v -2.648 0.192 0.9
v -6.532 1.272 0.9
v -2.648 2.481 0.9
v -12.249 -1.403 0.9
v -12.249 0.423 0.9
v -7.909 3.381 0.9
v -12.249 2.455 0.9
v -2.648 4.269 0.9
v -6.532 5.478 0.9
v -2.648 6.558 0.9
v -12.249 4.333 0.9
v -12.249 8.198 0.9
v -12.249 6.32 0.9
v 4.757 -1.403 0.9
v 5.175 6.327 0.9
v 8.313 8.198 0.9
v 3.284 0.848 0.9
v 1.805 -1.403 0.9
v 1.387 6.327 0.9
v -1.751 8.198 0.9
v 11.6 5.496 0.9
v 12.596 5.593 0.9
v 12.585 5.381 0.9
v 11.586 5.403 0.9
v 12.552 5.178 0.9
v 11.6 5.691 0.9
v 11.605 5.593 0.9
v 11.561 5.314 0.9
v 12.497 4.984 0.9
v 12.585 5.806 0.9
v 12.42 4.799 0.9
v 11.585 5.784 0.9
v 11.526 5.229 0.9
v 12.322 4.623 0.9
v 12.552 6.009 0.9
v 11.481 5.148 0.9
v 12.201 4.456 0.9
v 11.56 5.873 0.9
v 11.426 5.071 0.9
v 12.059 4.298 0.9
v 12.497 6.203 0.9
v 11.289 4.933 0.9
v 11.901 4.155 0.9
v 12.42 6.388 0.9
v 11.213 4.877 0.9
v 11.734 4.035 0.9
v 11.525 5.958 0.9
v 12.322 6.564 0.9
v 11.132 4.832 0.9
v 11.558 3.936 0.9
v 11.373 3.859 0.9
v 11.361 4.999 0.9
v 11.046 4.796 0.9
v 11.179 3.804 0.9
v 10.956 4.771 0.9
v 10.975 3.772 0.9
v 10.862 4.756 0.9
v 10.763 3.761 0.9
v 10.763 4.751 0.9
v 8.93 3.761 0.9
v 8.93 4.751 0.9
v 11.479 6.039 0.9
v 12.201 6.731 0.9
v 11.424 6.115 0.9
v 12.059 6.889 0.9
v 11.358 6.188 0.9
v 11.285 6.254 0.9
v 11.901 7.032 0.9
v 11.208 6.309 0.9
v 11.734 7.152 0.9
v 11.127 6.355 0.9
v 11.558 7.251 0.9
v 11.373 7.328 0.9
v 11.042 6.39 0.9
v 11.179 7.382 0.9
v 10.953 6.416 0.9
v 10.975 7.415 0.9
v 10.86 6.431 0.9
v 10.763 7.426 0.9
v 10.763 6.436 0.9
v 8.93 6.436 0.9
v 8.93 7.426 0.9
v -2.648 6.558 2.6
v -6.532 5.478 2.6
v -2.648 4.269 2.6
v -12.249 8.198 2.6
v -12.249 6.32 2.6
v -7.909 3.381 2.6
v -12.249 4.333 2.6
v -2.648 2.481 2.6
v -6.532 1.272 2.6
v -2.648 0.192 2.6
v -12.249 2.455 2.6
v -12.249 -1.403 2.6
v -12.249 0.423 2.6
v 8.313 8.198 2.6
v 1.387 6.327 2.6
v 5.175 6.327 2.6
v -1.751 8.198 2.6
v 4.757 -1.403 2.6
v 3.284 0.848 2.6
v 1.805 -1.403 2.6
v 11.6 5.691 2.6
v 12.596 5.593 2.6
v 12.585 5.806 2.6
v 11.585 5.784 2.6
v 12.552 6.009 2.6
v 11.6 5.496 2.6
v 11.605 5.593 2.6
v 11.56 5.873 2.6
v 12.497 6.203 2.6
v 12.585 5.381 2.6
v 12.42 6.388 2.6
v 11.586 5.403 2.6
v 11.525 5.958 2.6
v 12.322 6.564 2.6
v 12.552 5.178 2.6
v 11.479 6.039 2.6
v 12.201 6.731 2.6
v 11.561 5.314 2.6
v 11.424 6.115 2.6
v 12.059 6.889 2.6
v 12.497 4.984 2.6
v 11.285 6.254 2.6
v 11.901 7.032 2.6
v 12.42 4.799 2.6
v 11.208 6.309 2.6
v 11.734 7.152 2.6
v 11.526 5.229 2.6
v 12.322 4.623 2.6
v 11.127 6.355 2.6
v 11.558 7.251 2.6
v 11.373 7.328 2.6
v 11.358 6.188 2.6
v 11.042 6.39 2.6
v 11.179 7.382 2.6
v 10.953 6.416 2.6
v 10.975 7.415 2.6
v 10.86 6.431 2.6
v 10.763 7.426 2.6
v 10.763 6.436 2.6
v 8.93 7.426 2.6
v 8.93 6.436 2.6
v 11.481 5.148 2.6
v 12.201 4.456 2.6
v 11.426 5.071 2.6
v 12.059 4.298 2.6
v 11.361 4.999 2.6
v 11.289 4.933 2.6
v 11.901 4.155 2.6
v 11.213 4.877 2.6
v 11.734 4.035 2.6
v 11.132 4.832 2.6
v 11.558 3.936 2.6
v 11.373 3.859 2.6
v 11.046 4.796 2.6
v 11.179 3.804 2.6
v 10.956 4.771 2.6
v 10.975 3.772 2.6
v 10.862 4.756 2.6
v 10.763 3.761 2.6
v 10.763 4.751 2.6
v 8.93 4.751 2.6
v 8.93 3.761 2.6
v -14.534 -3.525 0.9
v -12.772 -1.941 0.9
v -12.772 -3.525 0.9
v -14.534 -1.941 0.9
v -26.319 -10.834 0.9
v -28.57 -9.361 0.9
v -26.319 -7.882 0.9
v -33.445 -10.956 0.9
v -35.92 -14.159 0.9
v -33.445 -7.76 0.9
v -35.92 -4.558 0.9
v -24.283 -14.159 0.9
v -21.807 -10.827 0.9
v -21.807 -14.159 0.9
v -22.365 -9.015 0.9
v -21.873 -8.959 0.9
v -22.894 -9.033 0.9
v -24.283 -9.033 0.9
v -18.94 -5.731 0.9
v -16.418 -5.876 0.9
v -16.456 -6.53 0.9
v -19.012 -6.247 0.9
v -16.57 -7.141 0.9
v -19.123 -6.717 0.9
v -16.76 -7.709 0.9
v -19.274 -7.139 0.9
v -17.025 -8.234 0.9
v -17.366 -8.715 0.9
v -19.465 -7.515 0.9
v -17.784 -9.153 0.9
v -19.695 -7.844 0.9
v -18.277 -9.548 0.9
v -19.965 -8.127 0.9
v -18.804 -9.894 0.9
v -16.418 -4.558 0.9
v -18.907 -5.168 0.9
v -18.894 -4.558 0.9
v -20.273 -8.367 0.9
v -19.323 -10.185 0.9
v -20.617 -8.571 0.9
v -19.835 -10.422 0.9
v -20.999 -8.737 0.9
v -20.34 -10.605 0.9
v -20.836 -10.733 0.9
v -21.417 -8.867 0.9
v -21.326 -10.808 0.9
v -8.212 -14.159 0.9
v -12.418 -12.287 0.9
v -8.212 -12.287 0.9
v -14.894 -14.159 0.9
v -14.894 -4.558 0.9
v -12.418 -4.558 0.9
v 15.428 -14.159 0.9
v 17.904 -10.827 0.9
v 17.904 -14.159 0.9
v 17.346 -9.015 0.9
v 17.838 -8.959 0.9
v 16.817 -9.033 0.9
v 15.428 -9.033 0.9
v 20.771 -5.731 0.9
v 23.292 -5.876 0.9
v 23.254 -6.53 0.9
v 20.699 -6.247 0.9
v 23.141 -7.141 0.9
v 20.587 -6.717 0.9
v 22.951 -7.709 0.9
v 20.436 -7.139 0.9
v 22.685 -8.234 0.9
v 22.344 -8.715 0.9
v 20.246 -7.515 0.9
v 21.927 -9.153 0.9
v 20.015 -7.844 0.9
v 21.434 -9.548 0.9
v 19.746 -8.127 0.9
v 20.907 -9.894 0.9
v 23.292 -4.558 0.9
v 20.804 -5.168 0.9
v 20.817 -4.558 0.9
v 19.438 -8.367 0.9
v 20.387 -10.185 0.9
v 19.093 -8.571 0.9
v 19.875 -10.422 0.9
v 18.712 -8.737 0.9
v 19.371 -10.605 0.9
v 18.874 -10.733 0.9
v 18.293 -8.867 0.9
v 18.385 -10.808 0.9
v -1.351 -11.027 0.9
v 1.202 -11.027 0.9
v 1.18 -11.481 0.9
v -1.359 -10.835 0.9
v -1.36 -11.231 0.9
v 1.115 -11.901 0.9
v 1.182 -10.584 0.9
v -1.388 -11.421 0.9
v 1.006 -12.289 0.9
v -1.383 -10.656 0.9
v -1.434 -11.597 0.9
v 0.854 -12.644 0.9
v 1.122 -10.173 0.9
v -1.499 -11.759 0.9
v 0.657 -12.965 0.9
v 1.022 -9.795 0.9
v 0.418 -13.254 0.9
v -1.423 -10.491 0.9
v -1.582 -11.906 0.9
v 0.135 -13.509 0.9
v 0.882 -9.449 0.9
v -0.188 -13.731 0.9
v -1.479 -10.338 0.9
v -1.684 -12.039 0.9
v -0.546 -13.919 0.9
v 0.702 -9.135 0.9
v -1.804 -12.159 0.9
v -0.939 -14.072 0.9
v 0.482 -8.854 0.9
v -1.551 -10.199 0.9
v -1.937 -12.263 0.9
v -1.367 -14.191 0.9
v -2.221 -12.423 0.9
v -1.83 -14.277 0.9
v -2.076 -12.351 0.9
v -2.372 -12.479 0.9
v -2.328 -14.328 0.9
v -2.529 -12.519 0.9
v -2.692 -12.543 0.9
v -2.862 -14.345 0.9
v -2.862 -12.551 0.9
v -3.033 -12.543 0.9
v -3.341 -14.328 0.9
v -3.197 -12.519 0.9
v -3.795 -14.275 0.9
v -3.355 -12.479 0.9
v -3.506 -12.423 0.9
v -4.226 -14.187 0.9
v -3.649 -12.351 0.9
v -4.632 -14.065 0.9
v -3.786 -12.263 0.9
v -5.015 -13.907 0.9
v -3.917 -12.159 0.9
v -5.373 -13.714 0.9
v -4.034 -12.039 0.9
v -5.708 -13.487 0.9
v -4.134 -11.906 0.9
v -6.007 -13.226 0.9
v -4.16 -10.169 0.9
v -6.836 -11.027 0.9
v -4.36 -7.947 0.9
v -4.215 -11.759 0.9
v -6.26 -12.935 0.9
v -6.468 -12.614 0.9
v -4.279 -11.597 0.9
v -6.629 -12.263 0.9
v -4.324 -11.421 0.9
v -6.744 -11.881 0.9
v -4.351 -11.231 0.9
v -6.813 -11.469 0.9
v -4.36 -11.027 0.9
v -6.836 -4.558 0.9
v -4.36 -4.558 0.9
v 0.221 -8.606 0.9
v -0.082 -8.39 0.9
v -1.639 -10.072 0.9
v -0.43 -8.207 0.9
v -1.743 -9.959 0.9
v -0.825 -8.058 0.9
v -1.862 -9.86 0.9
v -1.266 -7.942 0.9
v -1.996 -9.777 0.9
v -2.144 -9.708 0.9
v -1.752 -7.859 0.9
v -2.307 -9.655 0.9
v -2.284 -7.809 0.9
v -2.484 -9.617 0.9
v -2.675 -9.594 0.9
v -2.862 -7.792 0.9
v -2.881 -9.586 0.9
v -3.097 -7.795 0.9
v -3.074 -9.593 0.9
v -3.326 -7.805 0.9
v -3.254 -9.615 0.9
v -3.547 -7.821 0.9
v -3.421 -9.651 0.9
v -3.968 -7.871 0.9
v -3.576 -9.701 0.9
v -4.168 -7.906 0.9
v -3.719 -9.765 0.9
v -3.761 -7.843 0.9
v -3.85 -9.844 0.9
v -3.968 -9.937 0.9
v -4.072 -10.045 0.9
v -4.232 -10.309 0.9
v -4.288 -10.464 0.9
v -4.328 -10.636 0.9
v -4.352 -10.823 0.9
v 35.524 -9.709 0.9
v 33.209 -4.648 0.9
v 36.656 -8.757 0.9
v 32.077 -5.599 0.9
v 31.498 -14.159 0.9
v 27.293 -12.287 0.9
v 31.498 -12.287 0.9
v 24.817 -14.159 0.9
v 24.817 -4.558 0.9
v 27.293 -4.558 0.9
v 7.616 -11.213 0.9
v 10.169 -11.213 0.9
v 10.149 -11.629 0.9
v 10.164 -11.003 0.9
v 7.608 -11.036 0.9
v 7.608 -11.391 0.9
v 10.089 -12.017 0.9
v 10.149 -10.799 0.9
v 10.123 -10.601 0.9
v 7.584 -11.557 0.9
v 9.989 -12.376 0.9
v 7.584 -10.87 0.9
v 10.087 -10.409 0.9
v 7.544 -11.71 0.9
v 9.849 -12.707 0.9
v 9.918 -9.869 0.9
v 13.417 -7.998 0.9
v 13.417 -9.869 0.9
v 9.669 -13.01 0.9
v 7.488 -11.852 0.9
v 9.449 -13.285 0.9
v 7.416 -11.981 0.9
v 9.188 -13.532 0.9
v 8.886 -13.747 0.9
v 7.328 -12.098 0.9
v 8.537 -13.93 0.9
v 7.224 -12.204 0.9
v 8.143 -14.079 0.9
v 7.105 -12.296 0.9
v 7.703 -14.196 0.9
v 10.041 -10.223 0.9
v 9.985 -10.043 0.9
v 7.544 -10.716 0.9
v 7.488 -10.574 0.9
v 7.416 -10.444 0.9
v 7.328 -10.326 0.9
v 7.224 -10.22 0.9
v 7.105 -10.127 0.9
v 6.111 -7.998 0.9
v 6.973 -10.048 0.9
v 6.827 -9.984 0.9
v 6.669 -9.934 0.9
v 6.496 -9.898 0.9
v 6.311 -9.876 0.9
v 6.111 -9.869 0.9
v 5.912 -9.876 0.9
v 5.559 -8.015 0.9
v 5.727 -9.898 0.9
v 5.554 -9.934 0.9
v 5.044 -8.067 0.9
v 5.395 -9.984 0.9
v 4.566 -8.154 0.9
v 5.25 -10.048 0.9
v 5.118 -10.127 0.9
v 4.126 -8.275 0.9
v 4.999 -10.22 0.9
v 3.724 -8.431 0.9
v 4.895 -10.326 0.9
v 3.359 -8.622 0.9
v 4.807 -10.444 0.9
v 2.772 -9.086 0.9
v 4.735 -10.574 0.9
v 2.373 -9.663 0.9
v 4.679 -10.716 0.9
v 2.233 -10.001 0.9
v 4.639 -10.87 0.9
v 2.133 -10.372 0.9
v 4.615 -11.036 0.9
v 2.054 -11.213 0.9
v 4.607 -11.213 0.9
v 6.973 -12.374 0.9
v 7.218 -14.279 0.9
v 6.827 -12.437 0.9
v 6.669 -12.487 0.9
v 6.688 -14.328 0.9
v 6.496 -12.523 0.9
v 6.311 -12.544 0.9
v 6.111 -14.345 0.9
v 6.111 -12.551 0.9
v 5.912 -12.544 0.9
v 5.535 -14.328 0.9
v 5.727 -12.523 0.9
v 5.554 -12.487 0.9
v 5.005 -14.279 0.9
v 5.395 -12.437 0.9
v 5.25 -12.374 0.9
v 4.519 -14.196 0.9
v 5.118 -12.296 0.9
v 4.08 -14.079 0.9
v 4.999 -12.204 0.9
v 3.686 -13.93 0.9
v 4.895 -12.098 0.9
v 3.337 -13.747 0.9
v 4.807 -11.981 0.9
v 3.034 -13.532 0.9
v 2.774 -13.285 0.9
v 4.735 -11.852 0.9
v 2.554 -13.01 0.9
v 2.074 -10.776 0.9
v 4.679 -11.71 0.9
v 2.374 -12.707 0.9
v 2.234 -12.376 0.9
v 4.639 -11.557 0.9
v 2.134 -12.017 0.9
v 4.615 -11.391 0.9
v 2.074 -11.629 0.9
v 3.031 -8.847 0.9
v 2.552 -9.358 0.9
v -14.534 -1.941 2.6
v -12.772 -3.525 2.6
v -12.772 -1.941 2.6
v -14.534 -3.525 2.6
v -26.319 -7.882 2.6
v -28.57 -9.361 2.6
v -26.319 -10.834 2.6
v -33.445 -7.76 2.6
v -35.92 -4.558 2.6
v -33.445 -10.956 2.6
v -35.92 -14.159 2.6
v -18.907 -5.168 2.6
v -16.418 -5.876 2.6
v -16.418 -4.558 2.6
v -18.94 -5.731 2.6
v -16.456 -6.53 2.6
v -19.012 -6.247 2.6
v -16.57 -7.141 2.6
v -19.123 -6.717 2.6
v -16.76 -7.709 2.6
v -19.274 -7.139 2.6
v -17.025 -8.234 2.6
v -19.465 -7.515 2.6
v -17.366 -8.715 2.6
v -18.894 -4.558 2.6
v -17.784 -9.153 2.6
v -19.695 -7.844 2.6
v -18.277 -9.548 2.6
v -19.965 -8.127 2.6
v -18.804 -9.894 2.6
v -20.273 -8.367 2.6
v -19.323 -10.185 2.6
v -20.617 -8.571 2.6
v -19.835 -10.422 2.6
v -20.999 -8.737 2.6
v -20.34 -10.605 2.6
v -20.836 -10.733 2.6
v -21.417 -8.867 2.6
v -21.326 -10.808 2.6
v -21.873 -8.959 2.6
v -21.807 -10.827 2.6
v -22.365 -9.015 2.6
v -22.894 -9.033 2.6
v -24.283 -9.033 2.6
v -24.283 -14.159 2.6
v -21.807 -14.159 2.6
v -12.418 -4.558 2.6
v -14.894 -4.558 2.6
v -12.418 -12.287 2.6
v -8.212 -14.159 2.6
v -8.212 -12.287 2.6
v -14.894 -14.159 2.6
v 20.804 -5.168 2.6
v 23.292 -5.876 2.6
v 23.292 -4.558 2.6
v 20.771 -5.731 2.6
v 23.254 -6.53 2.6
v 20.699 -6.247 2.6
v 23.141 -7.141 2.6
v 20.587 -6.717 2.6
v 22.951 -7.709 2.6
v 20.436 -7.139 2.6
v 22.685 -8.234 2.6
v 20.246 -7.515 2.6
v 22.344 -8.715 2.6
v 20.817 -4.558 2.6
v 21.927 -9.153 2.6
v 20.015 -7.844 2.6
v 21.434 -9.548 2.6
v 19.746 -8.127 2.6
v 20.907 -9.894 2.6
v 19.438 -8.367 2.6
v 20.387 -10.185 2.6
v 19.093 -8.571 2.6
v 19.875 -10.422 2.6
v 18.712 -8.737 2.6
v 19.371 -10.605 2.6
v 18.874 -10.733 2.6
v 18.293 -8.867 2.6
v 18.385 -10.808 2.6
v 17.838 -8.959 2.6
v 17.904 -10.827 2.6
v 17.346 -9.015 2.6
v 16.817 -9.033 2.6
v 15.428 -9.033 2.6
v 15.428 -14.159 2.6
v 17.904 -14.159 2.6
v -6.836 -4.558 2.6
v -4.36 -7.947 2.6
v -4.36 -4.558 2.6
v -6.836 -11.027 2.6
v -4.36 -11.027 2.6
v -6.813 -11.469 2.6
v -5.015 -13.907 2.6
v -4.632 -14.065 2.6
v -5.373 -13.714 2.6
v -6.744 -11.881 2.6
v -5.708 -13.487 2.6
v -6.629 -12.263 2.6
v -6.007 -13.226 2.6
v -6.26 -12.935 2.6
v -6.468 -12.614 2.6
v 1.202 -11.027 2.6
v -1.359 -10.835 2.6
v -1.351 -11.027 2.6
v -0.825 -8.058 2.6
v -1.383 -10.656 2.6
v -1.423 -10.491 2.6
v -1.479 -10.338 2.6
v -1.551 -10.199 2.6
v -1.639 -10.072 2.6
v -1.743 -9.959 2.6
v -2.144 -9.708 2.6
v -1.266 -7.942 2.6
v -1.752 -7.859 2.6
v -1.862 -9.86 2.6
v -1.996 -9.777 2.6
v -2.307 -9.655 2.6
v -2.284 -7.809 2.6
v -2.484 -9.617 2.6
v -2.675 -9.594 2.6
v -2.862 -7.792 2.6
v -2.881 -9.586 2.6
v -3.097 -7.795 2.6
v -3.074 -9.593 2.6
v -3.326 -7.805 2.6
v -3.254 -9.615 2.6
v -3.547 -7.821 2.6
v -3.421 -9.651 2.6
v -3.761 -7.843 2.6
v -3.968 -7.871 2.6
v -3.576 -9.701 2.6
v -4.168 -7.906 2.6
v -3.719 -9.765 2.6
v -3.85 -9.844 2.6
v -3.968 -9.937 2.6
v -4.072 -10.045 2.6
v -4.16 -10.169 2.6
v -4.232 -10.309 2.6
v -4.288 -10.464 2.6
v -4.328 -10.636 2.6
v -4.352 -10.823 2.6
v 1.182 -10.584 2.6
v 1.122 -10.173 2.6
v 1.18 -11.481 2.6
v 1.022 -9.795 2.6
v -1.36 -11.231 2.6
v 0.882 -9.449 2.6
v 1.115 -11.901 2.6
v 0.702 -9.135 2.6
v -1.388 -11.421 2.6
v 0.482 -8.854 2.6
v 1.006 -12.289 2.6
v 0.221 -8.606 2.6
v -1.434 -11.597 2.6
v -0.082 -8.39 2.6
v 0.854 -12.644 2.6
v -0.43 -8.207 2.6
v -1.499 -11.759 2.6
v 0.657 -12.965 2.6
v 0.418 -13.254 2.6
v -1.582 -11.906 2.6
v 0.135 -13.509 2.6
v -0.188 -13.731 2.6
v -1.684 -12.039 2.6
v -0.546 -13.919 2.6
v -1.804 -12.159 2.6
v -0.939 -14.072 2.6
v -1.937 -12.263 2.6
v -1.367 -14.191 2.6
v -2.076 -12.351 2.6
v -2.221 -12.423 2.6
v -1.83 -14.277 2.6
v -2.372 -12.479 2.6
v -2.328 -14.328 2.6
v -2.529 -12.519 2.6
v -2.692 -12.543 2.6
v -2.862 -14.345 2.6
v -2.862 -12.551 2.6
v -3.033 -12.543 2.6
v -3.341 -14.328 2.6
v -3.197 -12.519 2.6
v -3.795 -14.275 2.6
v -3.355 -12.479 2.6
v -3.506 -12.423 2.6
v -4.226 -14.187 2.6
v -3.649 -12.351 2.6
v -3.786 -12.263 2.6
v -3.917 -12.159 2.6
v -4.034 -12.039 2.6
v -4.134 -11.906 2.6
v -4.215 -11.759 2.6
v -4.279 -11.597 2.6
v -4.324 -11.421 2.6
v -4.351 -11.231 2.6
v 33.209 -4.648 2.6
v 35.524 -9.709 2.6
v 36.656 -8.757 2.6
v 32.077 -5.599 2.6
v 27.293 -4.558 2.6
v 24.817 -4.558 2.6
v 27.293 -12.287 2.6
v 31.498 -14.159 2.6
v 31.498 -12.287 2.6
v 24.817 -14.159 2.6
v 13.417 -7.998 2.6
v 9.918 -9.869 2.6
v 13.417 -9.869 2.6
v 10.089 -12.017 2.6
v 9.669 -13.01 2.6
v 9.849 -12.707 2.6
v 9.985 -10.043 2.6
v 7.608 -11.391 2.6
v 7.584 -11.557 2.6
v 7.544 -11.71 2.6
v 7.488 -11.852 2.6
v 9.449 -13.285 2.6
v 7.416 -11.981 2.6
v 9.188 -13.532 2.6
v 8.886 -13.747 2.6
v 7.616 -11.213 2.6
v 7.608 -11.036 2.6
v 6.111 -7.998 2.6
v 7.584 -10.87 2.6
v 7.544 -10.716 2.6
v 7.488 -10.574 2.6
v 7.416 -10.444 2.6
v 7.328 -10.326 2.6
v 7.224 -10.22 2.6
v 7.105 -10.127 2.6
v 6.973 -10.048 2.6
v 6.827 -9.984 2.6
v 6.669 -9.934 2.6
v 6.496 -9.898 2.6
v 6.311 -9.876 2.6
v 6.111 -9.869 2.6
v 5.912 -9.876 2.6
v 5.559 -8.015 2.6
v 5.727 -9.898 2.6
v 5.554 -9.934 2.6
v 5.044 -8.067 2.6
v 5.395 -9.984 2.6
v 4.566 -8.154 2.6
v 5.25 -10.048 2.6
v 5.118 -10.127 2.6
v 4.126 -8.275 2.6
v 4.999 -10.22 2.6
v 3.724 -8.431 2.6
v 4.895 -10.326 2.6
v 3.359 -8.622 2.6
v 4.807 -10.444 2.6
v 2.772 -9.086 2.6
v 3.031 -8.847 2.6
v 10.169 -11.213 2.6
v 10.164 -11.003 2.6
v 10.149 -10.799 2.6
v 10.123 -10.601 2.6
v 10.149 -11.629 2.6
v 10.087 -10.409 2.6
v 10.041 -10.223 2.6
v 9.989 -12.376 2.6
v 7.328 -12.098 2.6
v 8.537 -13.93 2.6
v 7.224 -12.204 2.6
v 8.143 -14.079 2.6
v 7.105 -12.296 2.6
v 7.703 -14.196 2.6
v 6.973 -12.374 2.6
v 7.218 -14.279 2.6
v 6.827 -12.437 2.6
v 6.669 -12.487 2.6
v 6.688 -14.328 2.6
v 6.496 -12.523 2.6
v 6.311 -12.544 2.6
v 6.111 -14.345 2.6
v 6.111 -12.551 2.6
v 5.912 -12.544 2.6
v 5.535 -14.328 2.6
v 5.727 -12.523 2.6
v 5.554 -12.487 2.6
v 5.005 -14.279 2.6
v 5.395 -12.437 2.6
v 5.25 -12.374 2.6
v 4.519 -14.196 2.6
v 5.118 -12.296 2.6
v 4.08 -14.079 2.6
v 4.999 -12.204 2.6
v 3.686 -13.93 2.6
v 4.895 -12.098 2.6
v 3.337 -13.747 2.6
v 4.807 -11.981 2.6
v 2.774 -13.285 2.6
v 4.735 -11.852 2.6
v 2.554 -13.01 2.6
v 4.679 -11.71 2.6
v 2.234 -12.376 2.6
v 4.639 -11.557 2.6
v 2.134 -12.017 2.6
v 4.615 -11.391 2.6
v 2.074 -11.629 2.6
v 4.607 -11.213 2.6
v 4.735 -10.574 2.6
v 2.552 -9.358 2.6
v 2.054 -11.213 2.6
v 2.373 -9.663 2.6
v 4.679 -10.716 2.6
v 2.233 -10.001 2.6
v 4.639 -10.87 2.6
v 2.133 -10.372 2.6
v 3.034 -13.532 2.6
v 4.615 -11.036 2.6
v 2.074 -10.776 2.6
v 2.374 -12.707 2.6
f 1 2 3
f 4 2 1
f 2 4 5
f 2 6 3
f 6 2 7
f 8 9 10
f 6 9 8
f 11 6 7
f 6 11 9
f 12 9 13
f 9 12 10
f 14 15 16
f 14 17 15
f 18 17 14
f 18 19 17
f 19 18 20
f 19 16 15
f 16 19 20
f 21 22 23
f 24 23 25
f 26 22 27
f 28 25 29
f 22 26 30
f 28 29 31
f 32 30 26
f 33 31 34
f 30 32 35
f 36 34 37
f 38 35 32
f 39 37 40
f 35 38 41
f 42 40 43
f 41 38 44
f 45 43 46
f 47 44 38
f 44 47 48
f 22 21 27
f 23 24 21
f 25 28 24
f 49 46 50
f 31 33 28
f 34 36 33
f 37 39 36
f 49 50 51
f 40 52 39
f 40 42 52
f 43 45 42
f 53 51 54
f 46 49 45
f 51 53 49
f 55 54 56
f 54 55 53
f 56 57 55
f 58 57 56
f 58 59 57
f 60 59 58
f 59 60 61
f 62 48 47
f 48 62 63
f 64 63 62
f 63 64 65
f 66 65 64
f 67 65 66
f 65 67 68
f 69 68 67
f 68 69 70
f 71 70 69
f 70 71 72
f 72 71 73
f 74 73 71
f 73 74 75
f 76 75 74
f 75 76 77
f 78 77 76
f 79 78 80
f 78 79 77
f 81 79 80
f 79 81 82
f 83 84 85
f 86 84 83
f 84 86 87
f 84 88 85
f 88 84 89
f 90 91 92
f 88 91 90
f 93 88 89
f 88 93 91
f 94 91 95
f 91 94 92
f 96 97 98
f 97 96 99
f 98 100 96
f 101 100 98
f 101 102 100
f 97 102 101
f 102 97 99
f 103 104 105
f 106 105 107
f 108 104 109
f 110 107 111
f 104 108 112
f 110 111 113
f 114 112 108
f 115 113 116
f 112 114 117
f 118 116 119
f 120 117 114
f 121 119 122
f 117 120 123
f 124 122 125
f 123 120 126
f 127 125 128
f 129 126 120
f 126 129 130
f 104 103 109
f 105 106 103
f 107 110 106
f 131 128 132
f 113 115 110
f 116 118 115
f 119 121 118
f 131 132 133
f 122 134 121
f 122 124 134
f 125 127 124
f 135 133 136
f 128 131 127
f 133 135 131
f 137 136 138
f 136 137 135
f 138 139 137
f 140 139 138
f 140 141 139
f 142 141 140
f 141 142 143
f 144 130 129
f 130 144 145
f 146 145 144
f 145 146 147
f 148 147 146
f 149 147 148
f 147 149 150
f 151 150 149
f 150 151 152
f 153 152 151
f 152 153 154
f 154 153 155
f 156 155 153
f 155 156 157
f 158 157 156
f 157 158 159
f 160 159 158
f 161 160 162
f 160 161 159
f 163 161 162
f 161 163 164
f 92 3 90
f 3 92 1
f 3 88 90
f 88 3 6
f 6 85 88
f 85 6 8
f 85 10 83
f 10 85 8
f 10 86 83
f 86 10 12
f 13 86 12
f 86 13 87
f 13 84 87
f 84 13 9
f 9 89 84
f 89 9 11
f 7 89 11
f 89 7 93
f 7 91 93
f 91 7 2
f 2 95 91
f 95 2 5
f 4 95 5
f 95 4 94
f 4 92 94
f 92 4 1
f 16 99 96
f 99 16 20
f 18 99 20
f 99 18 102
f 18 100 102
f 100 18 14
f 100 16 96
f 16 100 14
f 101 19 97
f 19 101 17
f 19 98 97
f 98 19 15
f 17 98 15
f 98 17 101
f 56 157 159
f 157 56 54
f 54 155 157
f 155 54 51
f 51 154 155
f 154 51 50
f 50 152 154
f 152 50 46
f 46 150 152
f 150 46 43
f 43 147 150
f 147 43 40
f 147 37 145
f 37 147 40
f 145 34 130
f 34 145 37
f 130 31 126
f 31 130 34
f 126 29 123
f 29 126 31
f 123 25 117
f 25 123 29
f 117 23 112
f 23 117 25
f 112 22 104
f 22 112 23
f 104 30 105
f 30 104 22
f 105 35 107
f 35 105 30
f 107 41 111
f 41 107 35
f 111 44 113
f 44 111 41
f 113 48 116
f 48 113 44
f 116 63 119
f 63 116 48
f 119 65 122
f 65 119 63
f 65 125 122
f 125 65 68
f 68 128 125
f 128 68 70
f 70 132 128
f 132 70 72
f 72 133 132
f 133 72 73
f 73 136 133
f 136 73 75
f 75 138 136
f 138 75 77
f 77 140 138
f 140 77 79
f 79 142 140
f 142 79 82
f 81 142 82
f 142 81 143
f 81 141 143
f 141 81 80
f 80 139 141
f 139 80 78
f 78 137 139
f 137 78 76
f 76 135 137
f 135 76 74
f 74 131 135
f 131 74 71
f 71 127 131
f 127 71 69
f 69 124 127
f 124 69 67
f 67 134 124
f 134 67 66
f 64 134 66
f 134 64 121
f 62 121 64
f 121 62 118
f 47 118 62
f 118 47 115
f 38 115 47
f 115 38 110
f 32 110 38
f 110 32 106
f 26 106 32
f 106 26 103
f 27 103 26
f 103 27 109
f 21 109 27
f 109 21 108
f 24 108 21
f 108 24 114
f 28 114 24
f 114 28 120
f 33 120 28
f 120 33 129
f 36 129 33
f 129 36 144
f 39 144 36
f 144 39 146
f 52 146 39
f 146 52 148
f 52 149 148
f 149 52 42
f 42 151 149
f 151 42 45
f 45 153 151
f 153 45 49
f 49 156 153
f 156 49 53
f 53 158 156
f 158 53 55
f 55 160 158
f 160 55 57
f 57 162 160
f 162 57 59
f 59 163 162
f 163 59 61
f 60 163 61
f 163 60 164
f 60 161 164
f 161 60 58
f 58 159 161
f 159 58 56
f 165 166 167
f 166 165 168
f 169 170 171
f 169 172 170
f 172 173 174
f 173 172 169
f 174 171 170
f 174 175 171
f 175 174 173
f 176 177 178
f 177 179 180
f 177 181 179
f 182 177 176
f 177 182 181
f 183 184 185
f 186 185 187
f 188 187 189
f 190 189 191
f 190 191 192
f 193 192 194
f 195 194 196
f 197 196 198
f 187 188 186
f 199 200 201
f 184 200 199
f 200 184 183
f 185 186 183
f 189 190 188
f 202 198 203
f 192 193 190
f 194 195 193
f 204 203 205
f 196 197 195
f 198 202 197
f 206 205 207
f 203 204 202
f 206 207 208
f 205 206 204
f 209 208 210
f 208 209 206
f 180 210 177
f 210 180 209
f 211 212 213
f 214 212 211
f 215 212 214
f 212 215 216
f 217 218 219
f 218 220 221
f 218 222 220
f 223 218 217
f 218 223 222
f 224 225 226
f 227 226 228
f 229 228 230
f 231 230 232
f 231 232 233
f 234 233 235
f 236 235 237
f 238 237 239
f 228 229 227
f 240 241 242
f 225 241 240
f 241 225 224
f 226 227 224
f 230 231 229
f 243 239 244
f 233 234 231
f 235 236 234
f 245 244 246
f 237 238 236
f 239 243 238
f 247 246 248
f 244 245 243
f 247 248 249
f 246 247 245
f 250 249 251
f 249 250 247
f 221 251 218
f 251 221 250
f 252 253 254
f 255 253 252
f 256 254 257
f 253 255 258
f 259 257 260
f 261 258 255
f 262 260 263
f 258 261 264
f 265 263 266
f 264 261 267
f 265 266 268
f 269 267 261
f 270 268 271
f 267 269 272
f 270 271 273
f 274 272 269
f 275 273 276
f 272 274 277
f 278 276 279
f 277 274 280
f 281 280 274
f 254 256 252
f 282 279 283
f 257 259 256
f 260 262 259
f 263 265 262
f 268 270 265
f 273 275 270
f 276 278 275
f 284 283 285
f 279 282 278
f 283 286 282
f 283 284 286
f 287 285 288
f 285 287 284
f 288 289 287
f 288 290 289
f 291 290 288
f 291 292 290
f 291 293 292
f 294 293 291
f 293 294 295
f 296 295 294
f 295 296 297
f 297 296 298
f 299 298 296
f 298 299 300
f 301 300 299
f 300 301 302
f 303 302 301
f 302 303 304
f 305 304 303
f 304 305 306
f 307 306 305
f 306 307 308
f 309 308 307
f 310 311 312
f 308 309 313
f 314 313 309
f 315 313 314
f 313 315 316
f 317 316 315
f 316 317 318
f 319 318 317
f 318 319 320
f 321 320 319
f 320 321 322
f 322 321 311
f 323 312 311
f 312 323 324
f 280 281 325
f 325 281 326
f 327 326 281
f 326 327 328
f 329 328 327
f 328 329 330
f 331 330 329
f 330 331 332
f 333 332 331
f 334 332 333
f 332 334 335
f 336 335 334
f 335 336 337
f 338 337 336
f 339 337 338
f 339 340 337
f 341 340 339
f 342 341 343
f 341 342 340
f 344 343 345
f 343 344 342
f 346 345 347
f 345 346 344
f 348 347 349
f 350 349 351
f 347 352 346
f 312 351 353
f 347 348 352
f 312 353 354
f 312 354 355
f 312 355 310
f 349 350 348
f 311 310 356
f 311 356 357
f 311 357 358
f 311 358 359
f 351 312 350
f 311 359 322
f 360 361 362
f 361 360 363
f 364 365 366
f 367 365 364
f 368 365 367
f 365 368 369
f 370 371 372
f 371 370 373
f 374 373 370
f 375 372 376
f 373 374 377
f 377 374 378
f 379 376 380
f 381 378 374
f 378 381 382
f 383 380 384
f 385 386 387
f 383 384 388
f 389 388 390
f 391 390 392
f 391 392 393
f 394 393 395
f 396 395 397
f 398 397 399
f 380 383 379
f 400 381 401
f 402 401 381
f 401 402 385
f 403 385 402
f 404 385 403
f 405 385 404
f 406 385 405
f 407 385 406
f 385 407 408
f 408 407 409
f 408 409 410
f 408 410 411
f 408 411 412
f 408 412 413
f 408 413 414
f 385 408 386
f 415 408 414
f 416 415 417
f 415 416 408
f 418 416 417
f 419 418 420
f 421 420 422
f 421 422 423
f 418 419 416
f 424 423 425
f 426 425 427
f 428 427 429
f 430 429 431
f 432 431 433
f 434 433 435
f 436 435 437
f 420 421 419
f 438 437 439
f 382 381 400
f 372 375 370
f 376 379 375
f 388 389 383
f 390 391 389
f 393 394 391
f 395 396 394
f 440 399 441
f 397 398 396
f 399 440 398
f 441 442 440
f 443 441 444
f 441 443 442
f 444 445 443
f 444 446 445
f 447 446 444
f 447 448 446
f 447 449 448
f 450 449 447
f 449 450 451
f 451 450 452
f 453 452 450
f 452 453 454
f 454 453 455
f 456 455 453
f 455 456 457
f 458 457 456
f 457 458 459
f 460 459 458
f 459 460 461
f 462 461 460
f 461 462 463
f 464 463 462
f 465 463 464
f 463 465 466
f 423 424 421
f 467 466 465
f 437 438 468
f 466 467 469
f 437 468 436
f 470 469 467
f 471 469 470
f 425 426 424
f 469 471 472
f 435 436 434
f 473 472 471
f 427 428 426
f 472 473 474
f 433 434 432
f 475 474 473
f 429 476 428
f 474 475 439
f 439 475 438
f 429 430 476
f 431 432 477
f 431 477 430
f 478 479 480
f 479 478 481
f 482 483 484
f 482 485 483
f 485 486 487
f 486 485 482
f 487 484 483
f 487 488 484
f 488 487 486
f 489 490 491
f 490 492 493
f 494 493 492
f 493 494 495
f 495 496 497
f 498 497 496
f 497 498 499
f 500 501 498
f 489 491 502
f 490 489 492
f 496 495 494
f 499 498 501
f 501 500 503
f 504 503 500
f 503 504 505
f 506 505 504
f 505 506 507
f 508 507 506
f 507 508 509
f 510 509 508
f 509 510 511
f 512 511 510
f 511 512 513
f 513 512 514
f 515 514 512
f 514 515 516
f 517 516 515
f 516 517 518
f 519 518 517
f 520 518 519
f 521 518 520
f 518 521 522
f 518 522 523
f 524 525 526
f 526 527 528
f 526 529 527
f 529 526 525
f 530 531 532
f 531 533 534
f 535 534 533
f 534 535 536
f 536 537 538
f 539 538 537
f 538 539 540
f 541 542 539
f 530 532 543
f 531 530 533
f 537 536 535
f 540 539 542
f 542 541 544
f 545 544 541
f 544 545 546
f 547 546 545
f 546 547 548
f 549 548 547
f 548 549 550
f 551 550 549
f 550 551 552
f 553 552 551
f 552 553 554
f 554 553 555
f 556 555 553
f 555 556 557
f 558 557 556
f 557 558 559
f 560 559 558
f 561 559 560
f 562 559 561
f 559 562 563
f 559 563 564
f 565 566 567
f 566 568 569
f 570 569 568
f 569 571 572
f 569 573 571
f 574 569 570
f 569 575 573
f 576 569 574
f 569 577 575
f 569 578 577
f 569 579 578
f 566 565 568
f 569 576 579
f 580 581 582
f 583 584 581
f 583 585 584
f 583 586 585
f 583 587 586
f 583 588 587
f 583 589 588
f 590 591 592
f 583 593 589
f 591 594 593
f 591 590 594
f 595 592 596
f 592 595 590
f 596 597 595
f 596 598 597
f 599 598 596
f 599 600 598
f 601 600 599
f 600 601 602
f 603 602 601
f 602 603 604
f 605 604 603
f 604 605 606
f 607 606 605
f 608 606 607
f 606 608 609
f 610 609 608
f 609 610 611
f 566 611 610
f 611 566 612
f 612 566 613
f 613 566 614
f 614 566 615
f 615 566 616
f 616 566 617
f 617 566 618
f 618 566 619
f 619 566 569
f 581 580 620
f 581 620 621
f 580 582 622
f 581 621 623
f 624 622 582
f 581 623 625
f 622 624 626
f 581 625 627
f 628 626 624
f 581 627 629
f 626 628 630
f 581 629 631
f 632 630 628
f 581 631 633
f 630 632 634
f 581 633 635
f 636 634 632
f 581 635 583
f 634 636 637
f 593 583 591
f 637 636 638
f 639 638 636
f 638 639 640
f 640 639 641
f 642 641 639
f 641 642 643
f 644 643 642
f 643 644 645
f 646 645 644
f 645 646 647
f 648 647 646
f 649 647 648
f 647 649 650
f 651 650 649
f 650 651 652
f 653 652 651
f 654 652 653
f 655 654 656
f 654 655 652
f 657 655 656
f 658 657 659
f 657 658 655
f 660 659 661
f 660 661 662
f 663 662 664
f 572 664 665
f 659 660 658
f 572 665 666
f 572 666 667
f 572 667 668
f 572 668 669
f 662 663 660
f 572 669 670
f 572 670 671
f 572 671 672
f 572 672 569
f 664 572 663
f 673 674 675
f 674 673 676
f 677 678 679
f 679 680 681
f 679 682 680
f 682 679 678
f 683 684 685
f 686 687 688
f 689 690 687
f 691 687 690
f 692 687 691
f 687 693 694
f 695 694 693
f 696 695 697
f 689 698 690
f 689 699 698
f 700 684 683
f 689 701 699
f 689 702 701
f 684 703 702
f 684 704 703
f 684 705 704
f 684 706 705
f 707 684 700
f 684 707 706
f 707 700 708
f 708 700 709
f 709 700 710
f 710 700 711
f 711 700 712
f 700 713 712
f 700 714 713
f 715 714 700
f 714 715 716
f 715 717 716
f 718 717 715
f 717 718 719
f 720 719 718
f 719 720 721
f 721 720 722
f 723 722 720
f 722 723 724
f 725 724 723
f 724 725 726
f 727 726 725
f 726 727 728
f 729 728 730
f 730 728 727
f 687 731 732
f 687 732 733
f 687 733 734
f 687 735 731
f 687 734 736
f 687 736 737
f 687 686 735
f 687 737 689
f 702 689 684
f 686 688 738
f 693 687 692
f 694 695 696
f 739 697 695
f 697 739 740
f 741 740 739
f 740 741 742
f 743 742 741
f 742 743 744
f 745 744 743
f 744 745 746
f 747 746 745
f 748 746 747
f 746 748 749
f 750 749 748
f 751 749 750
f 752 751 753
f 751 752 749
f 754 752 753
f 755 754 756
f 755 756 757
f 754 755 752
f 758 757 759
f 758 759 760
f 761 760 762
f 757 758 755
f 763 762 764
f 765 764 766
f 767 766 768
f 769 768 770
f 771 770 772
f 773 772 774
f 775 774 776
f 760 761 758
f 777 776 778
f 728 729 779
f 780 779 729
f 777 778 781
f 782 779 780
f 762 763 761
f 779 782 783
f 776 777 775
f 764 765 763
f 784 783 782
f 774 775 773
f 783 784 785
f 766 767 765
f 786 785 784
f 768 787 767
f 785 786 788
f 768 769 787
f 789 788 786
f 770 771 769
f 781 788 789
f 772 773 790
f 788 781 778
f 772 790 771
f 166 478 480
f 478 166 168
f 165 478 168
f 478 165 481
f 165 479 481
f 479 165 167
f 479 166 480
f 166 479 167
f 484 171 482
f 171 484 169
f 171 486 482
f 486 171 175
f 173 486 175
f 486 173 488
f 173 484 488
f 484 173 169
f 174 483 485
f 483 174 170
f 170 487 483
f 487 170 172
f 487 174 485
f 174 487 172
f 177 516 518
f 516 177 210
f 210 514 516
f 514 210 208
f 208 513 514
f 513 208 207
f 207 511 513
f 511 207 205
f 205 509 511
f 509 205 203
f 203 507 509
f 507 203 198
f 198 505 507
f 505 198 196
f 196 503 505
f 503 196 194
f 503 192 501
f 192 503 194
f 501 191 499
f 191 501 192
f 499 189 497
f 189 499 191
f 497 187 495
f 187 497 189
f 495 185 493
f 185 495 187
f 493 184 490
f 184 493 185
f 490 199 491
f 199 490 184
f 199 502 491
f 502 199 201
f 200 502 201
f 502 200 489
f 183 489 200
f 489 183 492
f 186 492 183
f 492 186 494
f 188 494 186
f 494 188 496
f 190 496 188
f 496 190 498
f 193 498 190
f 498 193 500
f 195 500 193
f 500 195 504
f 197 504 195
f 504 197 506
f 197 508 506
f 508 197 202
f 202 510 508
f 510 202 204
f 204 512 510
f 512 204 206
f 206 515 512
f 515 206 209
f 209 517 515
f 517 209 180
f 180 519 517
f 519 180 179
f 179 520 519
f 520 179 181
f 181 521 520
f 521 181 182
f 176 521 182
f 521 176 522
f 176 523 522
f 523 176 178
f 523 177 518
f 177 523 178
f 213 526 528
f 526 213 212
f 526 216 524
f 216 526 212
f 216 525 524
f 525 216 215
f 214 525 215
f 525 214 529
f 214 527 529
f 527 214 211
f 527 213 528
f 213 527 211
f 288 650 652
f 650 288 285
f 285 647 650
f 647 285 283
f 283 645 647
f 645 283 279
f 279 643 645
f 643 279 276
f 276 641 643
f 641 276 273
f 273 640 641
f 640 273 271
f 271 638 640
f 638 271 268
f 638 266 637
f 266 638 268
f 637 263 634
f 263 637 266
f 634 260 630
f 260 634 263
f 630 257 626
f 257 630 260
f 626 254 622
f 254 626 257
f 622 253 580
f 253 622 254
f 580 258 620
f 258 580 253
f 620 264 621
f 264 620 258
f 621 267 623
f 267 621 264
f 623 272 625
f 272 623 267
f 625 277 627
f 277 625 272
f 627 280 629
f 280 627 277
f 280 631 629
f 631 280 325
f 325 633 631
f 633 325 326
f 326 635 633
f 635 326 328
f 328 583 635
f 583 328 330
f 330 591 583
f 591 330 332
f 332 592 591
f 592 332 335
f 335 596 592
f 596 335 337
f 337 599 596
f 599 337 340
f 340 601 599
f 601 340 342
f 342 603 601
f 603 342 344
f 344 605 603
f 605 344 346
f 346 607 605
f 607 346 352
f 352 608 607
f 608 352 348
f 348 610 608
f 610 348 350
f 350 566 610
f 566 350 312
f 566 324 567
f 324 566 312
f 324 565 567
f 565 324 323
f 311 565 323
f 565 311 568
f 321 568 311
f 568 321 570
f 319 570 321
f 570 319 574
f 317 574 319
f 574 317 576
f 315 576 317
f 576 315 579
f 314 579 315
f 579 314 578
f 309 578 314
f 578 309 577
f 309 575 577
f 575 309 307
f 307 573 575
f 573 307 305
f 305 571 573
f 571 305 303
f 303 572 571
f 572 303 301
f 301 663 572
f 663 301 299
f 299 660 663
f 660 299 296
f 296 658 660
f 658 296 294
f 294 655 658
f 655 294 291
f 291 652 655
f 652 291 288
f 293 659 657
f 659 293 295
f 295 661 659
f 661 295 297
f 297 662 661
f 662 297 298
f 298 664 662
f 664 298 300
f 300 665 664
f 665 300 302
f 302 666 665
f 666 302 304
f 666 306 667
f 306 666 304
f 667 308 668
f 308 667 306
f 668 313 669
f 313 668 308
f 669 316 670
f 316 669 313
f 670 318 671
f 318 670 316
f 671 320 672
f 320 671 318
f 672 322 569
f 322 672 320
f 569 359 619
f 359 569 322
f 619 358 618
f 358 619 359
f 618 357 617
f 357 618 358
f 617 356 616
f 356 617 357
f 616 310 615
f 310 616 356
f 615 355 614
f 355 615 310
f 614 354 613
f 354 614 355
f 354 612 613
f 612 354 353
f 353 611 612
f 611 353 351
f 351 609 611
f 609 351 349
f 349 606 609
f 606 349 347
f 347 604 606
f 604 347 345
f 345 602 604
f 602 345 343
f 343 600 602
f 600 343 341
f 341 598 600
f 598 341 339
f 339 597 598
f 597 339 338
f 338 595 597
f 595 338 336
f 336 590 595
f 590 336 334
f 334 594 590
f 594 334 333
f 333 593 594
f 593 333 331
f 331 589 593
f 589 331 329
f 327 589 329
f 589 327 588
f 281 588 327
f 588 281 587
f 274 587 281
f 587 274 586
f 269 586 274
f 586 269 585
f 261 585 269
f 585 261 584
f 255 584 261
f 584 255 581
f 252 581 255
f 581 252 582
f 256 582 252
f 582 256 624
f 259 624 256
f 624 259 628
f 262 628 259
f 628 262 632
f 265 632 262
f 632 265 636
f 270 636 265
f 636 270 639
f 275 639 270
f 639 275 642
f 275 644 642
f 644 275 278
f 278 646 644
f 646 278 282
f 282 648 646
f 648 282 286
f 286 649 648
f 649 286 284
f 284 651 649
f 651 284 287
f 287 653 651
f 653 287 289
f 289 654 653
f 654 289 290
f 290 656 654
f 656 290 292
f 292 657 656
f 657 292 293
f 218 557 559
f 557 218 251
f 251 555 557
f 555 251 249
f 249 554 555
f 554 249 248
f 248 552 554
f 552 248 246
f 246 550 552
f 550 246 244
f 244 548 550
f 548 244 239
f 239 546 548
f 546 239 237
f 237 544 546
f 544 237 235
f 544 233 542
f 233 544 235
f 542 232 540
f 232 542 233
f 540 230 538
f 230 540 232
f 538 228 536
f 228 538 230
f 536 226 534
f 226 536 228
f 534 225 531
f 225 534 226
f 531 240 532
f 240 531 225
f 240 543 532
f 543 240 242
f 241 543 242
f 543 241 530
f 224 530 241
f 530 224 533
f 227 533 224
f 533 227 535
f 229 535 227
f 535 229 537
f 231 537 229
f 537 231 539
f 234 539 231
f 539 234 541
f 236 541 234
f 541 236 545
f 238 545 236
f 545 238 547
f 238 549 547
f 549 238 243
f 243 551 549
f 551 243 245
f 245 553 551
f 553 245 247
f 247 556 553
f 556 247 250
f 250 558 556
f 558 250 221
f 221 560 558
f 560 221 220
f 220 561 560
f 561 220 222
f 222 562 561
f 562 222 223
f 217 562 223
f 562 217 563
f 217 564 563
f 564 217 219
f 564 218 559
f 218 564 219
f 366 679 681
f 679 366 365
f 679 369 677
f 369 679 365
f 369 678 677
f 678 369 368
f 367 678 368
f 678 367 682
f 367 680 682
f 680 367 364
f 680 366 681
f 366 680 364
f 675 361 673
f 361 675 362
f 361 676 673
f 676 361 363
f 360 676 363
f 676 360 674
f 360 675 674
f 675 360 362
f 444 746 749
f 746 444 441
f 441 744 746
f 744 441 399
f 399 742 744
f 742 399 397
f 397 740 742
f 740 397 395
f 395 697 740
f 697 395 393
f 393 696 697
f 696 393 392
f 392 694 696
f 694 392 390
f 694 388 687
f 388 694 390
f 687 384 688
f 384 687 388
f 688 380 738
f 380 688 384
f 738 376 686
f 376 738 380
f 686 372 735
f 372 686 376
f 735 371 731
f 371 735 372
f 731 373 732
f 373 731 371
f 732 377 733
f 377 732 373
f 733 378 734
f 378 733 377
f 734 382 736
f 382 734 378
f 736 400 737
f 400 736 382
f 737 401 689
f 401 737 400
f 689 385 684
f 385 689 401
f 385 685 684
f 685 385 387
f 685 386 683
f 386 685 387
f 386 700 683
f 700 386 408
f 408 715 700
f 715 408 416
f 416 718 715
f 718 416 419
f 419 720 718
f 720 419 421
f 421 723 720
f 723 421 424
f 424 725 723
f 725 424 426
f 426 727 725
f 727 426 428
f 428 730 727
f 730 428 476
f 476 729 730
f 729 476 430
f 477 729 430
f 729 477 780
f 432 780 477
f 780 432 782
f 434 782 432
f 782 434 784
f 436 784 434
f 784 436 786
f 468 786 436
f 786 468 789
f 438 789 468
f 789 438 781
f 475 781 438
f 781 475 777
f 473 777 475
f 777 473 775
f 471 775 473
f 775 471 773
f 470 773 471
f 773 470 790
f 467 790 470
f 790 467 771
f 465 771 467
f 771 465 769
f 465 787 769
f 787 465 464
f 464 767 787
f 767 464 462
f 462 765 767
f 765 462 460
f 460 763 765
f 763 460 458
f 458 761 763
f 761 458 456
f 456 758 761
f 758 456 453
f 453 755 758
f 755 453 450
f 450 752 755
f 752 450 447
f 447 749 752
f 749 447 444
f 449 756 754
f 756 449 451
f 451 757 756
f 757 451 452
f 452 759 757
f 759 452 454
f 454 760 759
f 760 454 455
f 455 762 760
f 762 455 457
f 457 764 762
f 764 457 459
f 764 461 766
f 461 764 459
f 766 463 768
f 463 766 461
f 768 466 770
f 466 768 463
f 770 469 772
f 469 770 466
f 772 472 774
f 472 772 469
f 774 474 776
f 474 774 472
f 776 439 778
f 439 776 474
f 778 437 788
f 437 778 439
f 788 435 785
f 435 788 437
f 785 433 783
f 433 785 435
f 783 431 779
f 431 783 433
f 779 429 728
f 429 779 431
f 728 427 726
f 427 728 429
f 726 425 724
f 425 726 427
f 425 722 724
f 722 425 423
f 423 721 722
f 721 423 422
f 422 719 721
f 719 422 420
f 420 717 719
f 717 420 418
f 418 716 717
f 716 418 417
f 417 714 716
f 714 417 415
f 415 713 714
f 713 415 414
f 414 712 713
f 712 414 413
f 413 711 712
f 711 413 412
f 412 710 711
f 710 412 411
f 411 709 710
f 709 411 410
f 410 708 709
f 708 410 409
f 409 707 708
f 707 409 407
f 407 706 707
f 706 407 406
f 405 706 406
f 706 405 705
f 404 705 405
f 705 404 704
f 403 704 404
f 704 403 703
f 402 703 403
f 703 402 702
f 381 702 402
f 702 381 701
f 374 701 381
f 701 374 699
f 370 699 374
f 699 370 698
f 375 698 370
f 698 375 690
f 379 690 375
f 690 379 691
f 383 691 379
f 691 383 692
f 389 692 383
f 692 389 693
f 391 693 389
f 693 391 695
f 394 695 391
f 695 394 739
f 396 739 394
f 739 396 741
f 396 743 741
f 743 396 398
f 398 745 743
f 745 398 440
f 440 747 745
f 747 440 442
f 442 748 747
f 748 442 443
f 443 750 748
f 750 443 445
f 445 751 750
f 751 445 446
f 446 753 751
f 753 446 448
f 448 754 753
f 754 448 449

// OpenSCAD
$fn = 48;
  // syllabics (overlaid on icon, tallest)
  translate([0, 3.285, 0.900]) linear_extrude(height=1.700) text("ᕒᐁᐣ", size=9.483, halign="center", valign="center", font="Euphemia UCAS:style=Bold");
  translate([0, -8.285, 0.900]) linear_extrude(height=1.700) text("ᐅᓯᒫᑲᓂᓯᒪᐠ", size=9.483, halign="center", valign="center", font="Euphemia UCAS:style=Bold");
